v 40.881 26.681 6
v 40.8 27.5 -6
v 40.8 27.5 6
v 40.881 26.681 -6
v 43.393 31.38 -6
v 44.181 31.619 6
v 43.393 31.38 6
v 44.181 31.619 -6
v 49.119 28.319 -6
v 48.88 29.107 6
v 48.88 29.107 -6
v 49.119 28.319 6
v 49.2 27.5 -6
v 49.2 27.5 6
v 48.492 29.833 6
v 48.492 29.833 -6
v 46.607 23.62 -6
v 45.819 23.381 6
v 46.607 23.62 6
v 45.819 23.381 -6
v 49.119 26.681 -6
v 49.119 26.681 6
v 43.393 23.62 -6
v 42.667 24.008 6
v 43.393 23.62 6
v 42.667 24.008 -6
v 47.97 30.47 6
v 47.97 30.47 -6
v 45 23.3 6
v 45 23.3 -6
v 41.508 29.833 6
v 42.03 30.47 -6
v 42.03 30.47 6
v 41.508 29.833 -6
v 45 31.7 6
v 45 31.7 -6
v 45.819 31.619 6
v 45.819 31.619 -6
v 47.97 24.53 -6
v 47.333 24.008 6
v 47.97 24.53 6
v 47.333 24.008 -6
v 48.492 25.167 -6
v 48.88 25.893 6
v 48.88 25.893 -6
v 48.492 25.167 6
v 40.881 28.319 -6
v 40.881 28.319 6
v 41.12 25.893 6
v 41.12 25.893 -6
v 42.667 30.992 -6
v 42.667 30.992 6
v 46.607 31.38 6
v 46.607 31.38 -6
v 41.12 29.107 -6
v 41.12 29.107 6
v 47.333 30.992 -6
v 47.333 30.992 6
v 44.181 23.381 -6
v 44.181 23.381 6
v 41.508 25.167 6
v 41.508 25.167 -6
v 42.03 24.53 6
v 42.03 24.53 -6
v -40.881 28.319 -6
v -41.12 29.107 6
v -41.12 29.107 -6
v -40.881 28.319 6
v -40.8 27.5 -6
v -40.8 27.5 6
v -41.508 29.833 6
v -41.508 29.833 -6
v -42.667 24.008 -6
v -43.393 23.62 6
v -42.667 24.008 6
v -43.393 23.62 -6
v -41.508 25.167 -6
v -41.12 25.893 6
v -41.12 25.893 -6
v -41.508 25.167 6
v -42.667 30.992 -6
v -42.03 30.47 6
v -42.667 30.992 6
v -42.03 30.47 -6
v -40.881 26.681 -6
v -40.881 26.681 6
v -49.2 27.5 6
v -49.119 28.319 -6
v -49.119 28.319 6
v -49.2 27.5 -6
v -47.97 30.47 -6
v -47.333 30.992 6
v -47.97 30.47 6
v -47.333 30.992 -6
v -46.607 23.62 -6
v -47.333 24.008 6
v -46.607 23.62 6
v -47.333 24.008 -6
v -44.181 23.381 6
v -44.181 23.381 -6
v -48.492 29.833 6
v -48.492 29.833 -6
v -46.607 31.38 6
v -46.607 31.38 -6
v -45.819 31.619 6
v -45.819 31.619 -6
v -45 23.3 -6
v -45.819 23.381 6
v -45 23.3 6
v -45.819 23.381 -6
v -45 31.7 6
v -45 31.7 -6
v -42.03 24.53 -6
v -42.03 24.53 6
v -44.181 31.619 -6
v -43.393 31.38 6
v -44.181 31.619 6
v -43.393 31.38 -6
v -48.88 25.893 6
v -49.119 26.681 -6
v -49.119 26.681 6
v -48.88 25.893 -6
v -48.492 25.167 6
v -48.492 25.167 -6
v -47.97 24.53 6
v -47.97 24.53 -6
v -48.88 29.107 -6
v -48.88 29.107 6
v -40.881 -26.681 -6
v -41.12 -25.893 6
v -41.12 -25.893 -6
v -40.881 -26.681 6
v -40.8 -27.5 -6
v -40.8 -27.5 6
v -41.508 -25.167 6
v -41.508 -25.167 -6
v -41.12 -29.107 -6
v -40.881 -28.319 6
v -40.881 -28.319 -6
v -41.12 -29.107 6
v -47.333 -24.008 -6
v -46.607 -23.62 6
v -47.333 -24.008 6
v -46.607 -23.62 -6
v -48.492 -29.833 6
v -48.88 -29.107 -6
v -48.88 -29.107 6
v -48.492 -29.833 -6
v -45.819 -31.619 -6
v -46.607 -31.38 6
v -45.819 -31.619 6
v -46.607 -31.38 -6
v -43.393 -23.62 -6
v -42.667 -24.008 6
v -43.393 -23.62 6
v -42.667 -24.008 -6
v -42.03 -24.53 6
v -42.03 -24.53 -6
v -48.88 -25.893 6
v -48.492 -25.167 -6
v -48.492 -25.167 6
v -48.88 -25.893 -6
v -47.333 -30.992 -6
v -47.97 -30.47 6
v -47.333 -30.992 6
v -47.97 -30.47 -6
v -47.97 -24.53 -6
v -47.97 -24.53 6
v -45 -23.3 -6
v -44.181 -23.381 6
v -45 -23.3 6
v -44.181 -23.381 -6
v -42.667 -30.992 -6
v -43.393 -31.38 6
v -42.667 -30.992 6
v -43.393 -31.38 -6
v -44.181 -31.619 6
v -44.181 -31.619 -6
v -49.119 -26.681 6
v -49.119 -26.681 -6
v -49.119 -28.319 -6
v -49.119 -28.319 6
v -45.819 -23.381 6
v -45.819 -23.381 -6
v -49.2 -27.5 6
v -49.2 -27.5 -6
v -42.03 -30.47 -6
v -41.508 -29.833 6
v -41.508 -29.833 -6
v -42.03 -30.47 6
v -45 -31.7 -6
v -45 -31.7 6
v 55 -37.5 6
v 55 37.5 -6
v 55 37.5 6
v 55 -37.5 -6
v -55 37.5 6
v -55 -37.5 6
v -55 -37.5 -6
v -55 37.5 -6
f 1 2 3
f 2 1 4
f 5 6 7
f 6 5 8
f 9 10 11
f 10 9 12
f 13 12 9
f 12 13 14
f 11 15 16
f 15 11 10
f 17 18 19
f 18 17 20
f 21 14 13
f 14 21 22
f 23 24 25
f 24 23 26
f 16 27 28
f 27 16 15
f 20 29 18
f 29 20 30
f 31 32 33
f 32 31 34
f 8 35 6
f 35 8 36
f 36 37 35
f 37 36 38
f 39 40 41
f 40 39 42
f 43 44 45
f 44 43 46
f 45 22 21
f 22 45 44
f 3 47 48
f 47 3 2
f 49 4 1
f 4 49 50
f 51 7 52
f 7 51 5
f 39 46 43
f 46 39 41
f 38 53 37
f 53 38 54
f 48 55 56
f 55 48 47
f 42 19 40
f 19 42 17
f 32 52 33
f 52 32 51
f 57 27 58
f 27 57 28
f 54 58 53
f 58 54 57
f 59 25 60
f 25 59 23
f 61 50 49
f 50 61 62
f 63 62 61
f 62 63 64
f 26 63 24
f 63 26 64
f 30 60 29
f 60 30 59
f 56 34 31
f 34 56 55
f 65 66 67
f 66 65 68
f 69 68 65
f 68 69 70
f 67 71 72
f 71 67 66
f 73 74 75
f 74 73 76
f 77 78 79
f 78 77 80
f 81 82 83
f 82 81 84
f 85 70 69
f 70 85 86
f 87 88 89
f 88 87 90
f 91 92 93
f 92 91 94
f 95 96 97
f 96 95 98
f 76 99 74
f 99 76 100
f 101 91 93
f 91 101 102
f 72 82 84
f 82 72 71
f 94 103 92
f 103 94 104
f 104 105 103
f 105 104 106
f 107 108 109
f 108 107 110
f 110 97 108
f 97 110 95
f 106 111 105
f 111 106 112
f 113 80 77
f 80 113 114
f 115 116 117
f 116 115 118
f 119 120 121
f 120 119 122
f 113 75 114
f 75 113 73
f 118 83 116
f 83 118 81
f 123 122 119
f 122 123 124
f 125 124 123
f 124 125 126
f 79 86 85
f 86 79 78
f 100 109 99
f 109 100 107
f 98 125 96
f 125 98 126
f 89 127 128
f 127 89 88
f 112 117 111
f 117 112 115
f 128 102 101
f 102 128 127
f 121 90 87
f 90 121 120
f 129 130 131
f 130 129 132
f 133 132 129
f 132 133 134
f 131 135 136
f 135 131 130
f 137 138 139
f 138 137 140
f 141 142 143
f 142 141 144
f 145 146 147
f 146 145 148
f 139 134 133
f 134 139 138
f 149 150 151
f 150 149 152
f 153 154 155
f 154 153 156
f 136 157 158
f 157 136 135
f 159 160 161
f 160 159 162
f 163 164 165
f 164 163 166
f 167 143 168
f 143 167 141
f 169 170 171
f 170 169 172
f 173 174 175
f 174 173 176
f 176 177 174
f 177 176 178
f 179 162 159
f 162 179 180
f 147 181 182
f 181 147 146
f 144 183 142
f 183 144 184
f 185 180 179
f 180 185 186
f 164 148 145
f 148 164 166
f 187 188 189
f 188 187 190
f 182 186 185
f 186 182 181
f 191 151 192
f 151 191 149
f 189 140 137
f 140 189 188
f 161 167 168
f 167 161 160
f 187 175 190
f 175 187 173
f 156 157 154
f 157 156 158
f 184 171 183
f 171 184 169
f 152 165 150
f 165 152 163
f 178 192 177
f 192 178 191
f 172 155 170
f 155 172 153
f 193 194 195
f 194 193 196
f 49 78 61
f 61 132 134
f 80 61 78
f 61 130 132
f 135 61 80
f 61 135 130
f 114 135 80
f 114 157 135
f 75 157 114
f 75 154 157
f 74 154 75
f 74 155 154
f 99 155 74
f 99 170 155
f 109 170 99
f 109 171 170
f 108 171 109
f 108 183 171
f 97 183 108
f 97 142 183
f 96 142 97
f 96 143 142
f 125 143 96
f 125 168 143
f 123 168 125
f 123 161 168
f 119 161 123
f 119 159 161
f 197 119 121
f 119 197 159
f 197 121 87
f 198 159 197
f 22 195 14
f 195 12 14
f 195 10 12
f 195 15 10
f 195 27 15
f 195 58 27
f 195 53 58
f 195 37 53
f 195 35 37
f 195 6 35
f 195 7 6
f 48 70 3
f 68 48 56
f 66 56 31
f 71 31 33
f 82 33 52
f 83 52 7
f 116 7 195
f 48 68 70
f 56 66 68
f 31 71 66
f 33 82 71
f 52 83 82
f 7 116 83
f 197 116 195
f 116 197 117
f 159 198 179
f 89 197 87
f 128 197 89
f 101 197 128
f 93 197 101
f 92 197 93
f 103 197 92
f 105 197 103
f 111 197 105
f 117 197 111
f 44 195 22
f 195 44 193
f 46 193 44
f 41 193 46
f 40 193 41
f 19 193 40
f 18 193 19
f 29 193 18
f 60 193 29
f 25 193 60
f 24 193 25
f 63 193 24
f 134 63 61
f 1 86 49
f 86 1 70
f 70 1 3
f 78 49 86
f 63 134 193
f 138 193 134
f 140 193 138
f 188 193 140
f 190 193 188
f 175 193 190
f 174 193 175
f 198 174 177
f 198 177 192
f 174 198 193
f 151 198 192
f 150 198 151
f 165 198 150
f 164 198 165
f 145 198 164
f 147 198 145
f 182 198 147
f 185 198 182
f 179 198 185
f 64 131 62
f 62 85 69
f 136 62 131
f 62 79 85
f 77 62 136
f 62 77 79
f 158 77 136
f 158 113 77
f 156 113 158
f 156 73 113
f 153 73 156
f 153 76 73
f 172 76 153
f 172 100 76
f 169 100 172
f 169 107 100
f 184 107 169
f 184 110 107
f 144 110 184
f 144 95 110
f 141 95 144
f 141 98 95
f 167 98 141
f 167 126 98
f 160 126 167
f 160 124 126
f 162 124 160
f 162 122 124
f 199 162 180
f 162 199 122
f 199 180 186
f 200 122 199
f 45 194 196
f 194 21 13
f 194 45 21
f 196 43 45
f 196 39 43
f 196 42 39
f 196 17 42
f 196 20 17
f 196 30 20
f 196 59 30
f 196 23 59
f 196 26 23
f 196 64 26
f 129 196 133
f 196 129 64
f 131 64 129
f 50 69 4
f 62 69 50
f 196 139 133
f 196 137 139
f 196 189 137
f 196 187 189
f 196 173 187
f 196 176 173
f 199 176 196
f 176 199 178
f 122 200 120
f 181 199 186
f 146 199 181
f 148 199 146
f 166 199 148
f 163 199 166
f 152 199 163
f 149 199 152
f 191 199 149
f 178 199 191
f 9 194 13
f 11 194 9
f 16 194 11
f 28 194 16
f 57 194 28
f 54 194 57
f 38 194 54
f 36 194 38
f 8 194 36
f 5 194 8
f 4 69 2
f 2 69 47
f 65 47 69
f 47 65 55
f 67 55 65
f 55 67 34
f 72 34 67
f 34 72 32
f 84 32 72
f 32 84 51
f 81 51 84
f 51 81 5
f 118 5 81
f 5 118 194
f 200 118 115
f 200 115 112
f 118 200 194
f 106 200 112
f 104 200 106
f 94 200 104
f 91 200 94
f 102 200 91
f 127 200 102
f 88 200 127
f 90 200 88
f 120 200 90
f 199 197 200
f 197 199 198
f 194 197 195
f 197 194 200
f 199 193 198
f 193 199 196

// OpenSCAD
$fn = 32;
// ----------------------------------------------------------------------
// Corner plate 110 x 75 x 12
// 3 holes, centres taken from the edge offset
// ----------------------------------------------------------------------

// --- parameters (mm) ---
plate = [110, 75, 12];  // overall size (x, y, z)
holes = 3;              // number of holes the drawing asks for
hole_d = 8.4;           // hole diameter
edge = 10;              // hole centre offset from the plate edge

// --- derived feature positions (mm) ---
corner_x = plate[0] / 2 - edge;  // = 45   corner hole X
corner_y = plate[1] / 2 - edge;  // = 27.5   corner hole Y
feature_centers = [
  [corner_x, corner_y],
  [-corner_x, corner_y],
  [-corner_x, -corner_y]
];   // hole centres the loop below drills

// plate outline, every hole drilled through with the same cutters
difference() {
  cube(plate, center = true);
  for (centre = feature_centers)
    translate([centre[0], centre[1], 0])
      cylinder(d = hole_d, h = plate[2] + 2, center = true);
}
